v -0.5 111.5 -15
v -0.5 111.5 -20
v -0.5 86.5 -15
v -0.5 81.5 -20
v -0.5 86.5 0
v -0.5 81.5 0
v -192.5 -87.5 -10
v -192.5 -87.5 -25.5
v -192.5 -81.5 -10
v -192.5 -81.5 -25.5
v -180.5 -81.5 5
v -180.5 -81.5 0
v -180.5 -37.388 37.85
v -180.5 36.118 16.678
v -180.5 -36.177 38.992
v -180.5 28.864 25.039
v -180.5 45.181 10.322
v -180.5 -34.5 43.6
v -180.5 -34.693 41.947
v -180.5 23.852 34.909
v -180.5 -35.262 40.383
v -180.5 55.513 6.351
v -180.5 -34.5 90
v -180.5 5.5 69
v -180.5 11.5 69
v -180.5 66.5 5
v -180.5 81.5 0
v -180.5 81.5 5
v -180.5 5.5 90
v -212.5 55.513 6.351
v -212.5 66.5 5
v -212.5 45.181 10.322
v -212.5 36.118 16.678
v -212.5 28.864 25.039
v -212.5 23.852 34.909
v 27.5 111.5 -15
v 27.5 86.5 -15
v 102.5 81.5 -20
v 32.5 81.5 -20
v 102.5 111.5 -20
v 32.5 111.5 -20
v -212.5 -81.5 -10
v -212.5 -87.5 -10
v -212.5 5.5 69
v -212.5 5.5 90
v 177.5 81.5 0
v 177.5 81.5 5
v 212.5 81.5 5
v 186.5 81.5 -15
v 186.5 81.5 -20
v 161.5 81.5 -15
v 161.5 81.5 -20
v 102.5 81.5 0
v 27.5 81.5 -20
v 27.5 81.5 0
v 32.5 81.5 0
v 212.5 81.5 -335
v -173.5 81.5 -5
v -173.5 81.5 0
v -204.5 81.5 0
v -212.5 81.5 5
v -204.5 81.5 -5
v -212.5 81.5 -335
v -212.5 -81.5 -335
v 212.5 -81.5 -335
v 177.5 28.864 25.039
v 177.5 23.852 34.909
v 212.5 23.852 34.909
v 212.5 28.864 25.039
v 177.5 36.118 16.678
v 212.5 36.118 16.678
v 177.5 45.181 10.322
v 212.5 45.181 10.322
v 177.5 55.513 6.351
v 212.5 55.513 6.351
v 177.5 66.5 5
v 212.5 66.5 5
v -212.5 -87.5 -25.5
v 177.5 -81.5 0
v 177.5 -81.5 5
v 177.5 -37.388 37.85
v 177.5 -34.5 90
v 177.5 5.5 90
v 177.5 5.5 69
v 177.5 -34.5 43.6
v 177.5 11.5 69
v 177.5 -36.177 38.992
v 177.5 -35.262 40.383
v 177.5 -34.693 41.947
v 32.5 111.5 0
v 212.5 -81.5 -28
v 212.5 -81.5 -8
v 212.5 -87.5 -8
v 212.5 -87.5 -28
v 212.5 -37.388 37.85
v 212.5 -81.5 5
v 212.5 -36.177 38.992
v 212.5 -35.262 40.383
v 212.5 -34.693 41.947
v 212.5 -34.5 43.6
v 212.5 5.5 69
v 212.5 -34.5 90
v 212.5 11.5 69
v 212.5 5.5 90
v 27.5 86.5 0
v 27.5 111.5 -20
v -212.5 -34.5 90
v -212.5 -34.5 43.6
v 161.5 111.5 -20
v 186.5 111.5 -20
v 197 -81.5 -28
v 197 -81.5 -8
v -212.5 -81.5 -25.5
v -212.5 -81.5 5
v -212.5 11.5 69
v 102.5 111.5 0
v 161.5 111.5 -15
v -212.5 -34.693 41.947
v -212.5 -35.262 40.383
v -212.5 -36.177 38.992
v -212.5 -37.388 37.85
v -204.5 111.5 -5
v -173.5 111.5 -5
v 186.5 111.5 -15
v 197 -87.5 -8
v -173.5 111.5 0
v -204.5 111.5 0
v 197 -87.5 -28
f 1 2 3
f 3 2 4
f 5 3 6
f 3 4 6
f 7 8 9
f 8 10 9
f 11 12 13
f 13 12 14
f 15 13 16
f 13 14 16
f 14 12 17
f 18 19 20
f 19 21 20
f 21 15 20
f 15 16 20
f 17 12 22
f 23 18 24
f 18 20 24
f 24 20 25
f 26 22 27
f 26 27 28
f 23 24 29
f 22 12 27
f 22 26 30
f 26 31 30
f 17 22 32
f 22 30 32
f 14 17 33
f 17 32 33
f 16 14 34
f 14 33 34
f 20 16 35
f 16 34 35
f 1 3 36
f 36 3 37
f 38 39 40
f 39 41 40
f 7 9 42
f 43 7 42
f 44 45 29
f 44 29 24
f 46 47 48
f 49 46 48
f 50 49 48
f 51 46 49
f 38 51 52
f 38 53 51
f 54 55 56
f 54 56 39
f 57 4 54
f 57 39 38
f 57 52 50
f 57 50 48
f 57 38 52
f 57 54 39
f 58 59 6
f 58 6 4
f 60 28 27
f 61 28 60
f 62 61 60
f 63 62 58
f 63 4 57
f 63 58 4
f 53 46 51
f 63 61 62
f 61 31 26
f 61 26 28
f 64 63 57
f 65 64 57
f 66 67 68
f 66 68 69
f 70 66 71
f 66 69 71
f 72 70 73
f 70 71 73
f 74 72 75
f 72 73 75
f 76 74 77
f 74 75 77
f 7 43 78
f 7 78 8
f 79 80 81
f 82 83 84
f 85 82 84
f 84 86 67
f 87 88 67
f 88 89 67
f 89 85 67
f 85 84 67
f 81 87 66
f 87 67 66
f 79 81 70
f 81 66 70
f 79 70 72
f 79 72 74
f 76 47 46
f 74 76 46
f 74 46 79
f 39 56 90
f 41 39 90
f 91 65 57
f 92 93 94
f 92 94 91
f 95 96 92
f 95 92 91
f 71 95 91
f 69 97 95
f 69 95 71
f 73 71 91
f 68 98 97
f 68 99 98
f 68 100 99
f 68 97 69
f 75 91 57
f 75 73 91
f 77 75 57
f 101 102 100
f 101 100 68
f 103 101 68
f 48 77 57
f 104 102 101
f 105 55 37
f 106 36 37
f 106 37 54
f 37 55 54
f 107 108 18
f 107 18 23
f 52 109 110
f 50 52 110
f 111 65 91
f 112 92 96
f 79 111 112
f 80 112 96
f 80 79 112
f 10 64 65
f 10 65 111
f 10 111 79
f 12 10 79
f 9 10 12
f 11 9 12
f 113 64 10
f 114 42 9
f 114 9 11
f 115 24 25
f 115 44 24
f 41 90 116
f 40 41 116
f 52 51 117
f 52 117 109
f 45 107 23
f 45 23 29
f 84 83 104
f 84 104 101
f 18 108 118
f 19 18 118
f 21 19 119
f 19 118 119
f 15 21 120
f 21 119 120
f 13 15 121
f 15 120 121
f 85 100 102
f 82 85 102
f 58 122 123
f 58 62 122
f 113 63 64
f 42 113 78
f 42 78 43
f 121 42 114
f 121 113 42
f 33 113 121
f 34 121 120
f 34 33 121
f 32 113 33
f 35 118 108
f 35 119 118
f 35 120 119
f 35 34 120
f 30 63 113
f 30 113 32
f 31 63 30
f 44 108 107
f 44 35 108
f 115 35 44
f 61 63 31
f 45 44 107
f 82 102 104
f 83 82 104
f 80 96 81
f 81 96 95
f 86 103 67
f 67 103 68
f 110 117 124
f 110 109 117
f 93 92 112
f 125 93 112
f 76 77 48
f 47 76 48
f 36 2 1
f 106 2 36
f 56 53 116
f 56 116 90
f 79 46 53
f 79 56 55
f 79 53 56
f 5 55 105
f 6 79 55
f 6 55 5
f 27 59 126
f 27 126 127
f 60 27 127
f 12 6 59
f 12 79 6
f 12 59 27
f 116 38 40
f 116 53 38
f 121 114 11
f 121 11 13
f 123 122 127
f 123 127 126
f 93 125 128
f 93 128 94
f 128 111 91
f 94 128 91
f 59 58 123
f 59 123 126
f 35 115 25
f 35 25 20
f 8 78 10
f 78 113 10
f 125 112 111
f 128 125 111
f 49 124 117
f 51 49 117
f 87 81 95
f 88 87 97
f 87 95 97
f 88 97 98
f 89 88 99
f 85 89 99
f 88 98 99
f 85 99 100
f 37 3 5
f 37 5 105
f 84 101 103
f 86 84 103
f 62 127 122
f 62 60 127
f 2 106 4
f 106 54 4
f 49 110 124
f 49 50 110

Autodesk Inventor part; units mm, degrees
ref_plane "YZ Plane" through (0, 0, 0) normal (1, 0, 0) x (0, 1, 0)
ref_plane "XZ Plane" through (0, 0, 0) normal (0, 1, 0) x (-1, 0, 0)
ref_plane "XY Plane" through (0, 0, 0) normal (0, 0, 1) x (1, 0, 0)
sketch "Sketch1" plane through (0, 0, 0) normal (0, 0, 1) x (1, 0, 0)
  line L0 (-212.5, -81.5) -> (212.5, -81.5)
  line L1 (212.5, -81.5) -> (212.5, 81.5)
  line L2 (212.5, 81.5) -> (-212.5, 81.5)
  line L3 (-212.5, 81.5) -> (-212.5, -81.5)
  line L4 (-212.5, -81.5) -> (212.5, 81.5) construction
  line L5 (212.5, -81.5) -> (-212.5, 81.5) construction
  point P0 (0, 0)
  dimension "d0" = 163
  dimension "d1" = 425
extrude "Extrusion1" add sketch "Sketch1" against normal blind 335
sketch "Sketch2" plane through (-212.5, -81.5, 0) normal (0, -1, 0) x (1, 0, 0)
  line L0 (0, 0) -> (425, 0) construction
  line L1 (425, -8) -> (409.5, -8)
  line L2 (409.5, -8) -> (409.5, -28)
  line L3 (409.5, -28) -> (425, -28)
  line L4 (425, -28) -> (425, -8)
  line L5 (20, -10) -> (0, -10)
  line L6 (0, -10) -> (0, -25.5)
  line L7 (0, -25.5) -> (20, -25.5)
  line L8 (20, -25.5) -> (20, -10)
  line L9 (0, -10) -> (0, 0) construction
  line L10 (425, -8) -> (425, 0) construction
  point P0 (212.5, 0)
  dimension "d0" = 163
  dimension "d4" = 8
  dimension "d5" = 10
  dimension "d6" = 15.5
  dimension "d7" = 20
  dimension "d8" = 15.5
  dimension "d9" = 20
extrude "Extrusion2" add sketch "Sketch2" along normal blind 6
sketch "Sketch3" plane through (212.5, -81.5, 0) normal (1, 0, 0) x (0, 0, -1)
  line L0 (0, 0) -> (0, 163) projected
  line L1 (0, 0) -> (-5, 0)
  line L2 (-5, 0) -> (-40, 47)
  line L3 (-40, 47) -> (-90, 47)
  line L4 (-90, 47) -> (-90, 87)
  line L5 (-90, 87) -> (-69, 87)
  line L6 (-69, 93) -> (-34.909, 105.3518)
  line L7 (-69, 87) -> (-69, 93)
  arc A0 (-34.909, 105.3518) -> (-5, 148) centre (-50.3612, 148) ccw
  line L8 (-34.909, 105.3518) -> (0, 118) construction
  arc A1 (-37.8496, 44.1124) -> (-43.6003, 47) centre (-43.6003, 39.8299) ccw
  line L9 (-5, 148) -> (-5, 163)
  line L10 (-5, 163) -> (0, 163)
  dimension "d12" = 5
  dimension "d13" = 47
  dimension "d14" = 35
  dimension "d15" = 40
  dimension "d16" = 90
  dimension "d17" = 118
  dimension "d18" = 93
  dimension "d19" = 69
  dimension "d23" = 55
  dimension "d26" = 5
  dimension "d27" = 15
extrude "Extrusion3" add sketch "Sketch3" against normal blind 35
sketch "Sketch4" plane through (-212.5, -81.5, 0) normal (-1, 0, 0) x (0, 0, 1)
  line L0 (0, 0) -> (0, 163) projected
  line L1 (0, 0) -> (5, 0) projected
  line L2 (5, 0) -> (37.8496, 44.1124) projected
  arc A0 (43.6003, 47) -> (37.8496, 44.1124) centre (43.6003, 39.8299) ccw projected
  line L3 (43.6003, 47) -> (90, 47) projected
  line L4 (90, 47) -> (90, 87) projected
  line L5 (90, 87) -> (69, 87) projected
  line L6 (69, 87) -> (69, 93) projected
  line L7 (69, 93) -> (34.909, 105.3518) projected
  arc A1 (5, 148) -> (34.909, 105.3518) centre (50.3612, 148) ccw projected
  line L8 (5, 148) -> (5, 163) projected
  line L9 (5, 163) -> (0, 163) projected
  point P0 (0, 81.5)
extrude "Extrusion4" add sketch "Sketch4" against normal blind 32
sketch "Sketch5" plane through (-212.5, 81.5, -335) normal (0, 1, 0) x (1, 0, 0)
  line L0 (390, -335) -> (32, -335) projected
  line L1 (32, -335) -> (8, -335)
  line L2 (8, -335) -> (8, -330)
  line L3 (8, -330) -> (39, -330)
  line L4 (39, -330) -> (39, -335)
  line L5 (0, 0) -> (0, -340) construction
  point P0 (212.5, -335)
  dimension "d28" = 39
  dimension "d29" = 5
  dimension "d30" = 8
extrude "Extrusion5" add sketch "Sketch5" along normal blind 30
sketch "Sketch6" plane through (-212.5, 81.5, -335) normal (0, 1, 0) x (1, 0, 0)
  line L0 (0, 0) -> (0, -340) construction
  line L1 (390, -335) -> (39, -335) projected
  line L2 (212, -335) -> (212, -315)
  line L3 (212, -315) -> (240, -315)
  line L4 (240, -315) -> (240, -335)
  point P0 (212.5, -335)
  dimension "d33" = 212
  dimension "d34" = 240
  dimension "d35" = 20
extrude "Extrusion6" add sketch "Sketch6" along normal blind 5
sketch "Sketch7" plane through (0, 0, 0) normal (0, 0, 1) x (1, 0, 0)
  line L0 (177.5, 81.5) -> (27.5, 81.5) projected
  line L1 (32.5, 81.5) -> (32.5, 111.5)
  line L2 (-212.5, -81.5) -> (-212.5, 81.5) construction
  line L3 (102.5, 81.5) -> (102.5, 111.5)
  line L4 (32.5, 111.5) -> (102.5, 111.5)
  point P0 (0, 0)
  dimension "d38" = 245
  dimension "d39" = 315
  dimension "d40" = 30
extrude "Extrusion7" add sketch "Sketch7" against normal blind 20
sketch "Sketch8" plane through (-212.5, 81.5, -335) normal (0, 1, 0) x (1, 0, 0)
  line L0 (0, 0) -> (0, -340) construction
  line L1 (374, -315) -> (399, -315)
  line L2 (399, -315) -> (399, -320)
  line L3 (399, -320) -> (374, -320)
  line L4 (374, -320) -> (374, -315)
  line L5 (390, -335) -> (315, -335) construction
  point P0 (212.5, -335)
  dimension "d43" = 374
  dimension "d44" = 399
  dimension "d45" = 15
  dimension "d46" = 20
extrude "Extrusion8" add sketch "Sketch8" along normal blind 30
sketch "Sketch9" plane through (-212.5, 86.5, -335) normal (0, 1, 0) x (1, 0, 0)
  line L0 (240, -315) -> (212, -315) projected
  line L1 (240, -335) -> (240, -315) projected
  line L2 (212, -320) -> (240, -320)
  line L3 (212, -315) -> (212, -320)
  line L4 (8, -330) -> (8, -335) construction
  point P0 (212.5, -335)
extrude "Extrusion9" add sketch "Sketch9" along normal up to surface (25 mm away)
properties part number "IMA Battery Case Primitive"
